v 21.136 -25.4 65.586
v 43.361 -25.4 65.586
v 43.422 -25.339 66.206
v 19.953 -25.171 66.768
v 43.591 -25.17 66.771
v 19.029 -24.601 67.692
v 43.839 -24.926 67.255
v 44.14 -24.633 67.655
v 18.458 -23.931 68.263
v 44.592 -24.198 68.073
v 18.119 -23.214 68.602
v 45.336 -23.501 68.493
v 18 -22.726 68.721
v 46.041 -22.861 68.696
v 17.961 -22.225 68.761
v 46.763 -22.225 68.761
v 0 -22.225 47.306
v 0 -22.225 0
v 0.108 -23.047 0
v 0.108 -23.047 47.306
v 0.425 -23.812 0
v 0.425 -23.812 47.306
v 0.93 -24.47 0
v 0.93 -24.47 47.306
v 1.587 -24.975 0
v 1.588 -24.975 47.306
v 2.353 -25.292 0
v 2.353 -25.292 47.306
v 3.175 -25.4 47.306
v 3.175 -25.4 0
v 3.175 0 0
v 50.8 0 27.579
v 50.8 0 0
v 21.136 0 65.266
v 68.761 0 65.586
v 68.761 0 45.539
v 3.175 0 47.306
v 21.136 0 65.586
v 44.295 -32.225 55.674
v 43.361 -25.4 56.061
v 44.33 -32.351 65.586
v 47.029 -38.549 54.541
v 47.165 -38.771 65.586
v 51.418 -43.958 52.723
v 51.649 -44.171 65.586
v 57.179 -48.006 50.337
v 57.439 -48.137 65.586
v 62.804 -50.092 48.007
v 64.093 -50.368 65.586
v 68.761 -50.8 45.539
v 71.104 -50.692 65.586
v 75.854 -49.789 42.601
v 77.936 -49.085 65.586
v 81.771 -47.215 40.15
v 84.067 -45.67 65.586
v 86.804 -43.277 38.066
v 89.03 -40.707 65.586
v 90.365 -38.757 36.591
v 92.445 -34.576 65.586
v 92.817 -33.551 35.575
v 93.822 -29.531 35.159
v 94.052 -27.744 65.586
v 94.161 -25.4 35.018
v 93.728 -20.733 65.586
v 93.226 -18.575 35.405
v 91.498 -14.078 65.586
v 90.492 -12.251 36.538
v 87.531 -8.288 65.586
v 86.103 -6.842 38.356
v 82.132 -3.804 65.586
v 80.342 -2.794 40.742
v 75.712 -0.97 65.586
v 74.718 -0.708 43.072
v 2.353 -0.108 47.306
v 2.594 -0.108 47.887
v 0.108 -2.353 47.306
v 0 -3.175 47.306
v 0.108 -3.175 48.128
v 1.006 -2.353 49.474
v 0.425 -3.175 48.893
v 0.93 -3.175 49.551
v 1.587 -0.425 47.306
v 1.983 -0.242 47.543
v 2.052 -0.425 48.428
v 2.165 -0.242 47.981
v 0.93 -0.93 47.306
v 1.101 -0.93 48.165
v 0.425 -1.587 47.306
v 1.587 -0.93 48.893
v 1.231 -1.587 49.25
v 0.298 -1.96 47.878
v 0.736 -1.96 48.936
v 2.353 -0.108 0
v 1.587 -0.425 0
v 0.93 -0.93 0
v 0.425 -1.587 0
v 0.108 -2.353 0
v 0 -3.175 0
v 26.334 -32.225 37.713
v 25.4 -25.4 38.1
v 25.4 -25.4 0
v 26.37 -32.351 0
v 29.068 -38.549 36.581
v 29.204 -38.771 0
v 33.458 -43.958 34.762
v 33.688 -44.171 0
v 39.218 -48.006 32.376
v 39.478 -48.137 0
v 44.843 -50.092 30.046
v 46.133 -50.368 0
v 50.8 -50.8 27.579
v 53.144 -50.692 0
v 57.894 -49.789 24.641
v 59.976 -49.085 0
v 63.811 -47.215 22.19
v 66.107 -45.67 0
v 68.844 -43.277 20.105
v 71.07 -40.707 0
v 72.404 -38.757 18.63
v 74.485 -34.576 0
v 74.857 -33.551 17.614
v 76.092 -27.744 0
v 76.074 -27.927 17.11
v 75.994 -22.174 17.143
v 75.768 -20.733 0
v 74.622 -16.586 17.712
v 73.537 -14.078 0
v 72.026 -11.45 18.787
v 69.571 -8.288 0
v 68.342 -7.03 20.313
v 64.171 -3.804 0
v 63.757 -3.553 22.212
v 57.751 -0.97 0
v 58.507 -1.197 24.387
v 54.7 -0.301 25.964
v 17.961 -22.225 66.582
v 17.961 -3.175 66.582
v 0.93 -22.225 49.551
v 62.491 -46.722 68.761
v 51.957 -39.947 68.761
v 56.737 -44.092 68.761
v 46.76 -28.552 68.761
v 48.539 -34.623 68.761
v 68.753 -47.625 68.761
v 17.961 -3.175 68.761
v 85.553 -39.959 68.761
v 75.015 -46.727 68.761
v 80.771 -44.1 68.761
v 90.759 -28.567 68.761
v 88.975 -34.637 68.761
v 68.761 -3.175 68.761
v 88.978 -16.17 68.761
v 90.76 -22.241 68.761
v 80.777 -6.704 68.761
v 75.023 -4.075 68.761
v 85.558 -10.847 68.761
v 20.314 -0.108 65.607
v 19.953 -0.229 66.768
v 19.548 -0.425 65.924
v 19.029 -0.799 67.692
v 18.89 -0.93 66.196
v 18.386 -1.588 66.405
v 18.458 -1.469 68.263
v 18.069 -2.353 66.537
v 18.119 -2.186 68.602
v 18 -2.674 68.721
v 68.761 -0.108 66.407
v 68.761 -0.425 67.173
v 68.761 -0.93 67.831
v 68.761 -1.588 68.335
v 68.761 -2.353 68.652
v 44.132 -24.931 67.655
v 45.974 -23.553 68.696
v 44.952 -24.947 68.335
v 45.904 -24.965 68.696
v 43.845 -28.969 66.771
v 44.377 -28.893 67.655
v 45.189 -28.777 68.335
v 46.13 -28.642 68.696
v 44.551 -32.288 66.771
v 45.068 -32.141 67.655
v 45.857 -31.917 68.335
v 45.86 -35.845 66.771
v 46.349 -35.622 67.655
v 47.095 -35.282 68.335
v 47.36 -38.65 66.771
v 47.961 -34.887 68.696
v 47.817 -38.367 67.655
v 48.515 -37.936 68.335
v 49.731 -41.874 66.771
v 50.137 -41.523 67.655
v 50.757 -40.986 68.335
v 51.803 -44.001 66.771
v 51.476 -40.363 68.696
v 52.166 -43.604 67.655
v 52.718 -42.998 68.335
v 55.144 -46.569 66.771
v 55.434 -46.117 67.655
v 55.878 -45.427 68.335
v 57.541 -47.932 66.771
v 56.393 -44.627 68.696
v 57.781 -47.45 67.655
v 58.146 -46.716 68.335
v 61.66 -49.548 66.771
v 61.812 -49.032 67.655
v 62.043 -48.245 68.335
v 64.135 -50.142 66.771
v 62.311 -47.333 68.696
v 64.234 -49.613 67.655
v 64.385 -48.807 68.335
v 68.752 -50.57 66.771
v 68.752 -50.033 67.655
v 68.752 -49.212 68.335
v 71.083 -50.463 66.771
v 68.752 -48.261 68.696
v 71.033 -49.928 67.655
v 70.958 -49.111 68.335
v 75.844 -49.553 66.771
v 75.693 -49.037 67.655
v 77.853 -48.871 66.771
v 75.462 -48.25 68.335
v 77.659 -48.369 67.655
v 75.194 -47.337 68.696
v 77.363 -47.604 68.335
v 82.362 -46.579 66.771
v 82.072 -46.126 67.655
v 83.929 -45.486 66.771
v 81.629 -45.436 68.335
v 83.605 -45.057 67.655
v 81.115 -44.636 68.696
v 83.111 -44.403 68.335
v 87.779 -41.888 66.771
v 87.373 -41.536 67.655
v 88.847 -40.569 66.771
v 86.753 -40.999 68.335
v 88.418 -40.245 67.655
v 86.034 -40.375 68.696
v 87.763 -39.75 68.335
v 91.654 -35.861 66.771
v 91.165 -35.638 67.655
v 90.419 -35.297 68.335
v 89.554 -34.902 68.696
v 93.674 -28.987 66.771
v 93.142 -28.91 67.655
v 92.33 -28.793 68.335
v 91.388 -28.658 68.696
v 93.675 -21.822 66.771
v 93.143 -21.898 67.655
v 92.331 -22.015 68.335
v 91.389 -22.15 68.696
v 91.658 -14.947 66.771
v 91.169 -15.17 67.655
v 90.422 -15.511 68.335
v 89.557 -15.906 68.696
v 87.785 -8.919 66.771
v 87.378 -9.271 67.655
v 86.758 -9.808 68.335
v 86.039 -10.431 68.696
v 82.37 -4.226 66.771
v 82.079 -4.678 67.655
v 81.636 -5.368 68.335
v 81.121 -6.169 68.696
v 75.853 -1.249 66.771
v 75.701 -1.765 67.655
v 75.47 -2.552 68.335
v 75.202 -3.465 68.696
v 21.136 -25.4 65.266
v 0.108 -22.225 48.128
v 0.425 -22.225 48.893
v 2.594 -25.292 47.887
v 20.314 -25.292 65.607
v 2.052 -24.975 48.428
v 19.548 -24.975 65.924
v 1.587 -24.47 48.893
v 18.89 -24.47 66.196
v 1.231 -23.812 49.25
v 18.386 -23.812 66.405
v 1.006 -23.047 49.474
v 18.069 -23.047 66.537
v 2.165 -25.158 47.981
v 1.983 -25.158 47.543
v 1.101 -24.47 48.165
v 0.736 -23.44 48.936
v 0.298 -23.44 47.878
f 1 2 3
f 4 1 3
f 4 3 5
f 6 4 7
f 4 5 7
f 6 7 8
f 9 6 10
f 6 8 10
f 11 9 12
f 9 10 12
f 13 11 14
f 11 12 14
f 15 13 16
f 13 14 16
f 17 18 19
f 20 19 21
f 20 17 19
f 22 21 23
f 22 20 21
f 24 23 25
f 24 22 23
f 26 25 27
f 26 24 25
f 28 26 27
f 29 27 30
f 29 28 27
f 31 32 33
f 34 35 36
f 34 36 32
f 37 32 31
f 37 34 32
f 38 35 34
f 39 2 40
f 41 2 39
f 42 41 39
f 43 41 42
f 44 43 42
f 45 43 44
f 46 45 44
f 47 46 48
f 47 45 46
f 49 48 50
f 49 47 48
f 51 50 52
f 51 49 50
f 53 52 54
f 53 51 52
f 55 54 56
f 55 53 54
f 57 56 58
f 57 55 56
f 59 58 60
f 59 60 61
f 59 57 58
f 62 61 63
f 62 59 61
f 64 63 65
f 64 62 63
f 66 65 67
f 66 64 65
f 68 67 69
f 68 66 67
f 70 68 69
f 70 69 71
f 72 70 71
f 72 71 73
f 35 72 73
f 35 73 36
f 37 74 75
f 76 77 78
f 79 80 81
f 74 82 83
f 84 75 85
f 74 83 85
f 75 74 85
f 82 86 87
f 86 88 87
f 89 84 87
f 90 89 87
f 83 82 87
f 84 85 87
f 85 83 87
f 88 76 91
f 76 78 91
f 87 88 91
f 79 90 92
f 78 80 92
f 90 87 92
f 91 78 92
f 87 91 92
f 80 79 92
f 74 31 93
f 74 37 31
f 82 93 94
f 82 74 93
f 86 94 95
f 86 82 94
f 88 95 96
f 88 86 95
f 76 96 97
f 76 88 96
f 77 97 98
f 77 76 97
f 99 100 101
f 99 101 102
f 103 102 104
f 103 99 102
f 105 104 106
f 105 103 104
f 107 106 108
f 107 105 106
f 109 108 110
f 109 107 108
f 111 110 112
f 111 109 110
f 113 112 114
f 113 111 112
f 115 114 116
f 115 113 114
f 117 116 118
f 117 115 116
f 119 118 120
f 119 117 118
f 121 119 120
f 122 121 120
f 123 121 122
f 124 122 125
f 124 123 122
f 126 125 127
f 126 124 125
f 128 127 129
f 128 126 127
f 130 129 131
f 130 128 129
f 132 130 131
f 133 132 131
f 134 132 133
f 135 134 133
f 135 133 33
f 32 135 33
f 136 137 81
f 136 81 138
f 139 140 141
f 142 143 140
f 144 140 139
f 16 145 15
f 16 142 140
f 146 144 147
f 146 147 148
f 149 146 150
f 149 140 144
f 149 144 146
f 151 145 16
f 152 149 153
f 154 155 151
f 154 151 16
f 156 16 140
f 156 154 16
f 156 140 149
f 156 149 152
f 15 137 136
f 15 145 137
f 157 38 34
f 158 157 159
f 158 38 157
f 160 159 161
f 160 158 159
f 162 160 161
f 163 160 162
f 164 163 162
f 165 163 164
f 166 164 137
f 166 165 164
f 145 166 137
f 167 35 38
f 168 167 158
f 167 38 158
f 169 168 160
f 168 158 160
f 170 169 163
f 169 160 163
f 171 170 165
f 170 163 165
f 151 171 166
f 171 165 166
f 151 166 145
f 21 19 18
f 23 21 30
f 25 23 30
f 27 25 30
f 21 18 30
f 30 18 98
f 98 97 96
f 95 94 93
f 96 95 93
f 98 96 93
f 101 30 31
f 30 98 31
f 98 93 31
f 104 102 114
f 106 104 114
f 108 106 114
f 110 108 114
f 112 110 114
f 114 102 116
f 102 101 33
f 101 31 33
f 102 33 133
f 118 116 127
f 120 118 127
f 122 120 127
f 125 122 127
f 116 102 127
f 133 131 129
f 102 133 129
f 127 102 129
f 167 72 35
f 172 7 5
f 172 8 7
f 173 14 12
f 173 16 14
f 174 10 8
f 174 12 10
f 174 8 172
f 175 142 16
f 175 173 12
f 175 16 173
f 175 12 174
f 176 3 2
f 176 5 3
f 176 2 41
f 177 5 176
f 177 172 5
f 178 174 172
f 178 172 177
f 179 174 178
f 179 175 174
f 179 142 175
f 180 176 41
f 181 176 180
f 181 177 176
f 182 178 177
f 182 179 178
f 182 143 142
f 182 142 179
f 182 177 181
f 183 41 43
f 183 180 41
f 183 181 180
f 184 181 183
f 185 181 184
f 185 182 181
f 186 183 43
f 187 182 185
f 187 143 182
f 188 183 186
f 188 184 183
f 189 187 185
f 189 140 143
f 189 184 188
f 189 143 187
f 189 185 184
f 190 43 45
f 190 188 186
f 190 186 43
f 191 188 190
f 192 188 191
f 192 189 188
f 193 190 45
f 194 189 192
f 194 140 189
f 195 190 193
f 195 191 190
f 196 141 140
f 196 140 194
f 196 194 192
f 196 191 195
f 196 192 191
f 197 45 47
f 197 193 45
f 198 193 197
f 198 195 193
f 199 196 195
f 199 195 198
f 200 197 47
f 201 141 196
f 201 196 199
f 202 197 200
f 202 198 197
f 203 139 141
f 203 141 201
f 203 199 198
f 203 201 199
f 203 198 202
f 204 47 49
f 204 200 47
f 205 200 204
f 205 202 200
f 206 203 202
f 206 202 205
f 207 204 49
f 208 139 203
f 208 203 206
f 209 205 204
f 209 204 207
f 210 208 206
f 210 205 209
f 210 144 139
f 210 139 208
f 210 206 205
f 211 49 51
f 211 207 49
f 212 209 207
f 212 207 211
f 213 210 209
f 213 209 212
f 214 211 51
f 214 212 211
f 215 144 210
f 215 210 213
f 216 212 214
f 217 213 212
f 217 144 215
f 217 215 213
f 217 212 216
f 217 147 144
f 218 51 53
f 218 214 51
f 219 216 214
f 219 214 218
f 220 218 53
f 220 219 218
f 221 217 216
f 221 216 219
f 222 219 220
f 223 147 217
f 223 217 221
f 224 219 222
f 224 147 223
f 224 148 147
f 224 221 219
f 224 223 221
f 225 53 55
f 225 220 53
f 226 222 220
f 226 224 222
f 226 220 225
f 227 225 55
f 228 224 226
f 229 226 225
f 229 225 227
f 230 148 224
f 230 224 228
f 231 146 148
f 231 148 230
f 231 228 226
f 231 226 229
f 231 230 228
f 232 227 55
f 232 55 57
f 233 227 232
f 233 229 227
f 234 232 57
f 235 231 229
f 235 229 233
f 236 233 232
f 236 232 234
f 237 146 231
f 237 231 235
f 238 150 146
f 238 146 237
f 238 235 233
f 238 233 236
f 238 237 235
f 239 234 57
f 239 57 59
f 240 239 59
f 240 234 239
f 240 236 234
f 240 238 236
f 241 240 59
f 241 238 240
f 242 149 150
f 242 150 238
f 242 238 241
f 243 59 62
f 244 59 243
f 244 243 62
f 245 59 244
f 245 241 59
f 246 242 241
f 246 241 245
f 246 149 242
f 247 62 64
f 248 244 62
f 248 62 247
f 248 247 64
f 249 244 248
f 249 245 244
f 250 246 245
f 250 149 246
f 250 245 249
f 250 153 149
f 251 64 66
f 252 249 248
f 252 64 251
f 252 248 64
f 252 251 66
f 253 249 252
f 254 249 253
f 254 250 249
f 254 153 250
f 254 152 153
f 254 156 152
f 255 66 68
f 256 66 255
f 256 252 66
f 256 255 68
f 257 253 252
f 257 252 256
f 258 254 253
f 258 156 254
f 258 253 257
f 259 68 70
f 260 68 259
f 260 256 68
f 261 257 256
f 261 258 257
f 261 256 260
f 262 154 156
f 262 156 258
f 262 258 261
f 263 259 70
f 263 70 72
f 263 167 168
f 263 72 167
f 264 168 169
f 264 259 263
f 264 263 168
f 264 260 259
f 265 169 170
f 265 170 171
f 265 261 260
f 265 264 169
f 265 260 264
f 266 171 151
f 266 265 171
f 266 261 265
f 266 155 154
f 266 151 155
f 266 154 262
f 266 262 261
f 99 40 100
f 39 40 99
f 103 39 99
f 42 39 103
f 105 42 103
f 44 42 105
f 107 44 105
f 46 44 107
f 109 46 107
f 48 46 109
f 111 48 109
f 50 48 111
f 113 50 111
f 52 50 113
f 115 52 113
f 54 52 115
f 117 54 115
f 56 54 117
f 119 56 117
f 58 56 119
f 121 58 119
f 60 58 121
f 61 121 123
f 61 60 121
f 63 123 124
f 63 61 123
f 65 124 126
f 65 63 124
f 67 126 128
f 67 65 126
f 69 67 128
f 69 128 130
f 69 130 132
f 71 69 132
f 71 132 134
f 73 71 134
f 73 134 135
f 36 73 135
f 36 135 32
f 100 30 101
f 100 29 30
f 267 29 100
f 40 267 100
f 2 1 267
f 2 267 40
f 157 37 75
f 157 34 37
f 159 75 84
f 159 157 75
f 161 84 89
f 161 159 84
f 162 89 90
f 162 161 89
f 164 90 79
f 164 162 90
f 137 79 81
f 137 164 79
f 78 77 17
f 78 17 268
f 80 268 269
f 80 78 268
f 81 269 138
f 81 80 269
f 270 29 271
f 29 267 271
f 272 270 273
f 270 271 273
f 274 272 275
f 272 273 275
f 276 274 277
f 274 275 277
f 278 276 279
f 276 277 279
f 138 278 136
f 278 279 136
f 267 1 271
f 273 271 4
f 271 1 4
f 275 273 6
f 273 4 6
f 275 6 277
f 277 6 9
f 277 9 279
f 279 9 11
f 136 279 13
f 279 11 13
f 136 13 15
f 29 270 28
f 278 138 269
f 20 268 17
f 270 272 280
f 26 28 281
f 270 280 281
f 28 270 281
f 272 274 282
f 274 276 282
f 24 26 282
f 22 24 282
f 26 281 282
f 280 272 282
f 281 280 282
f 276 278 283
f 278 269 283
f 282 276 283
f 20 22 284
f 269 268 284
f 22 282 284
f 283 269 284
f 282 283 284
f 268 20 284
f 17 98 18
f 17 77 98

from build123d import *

# Parameters (mm, degrees)
F3_R = 3.175


with BuildPart() as f2:
    # F2: sweep along a path in F1
    with BuildLine(Plane.XZ) as f2_path:
        Line((25.4, 0), (25.4, 38.1))
        Line((25.4, 38.1), (43.3605122421, 56.0605122421))
        Line((43.3605122421, 56.0605122421), (43.3605122421, 68.7605122421))
    # F0 (on Top) → F2 (sweep)
    with BuildSketch(Plane.XY):
        with BuildLine():
            Line((50.8, 0), (0, 0))
            Line((0, 0), (0, -25.4))
            Line((0, -25.4), (25.4, -25.4))
            ThreePointArc((25.4, -25.4), (68.7605122421, -43.3605122421), (50.8, 0))
        make_face()
    sweep(path=f2_path.line, transition=Transition.RIGHT)

    # F3
    f3_edges = [f2.edges().sort_by_distance(p)[0] for p in [
        (8.980256, -25.4, 57.601281),
        (0, -25.4, 24.310512),
        (0, -12.7, 48.621024),
        (0, 0, 24.310512),
        (8.980256, 0, 57.601281),
        (17.960512, -25.4, 67.671024),
        (30.660512, -25.4, 68.760512),
        (17.960512, 0, 67.671024),
        (43.360512, 0, 68.760512),
    ]]
    fillet(f3_edges, radius=F3_R)


solid = f2.part
